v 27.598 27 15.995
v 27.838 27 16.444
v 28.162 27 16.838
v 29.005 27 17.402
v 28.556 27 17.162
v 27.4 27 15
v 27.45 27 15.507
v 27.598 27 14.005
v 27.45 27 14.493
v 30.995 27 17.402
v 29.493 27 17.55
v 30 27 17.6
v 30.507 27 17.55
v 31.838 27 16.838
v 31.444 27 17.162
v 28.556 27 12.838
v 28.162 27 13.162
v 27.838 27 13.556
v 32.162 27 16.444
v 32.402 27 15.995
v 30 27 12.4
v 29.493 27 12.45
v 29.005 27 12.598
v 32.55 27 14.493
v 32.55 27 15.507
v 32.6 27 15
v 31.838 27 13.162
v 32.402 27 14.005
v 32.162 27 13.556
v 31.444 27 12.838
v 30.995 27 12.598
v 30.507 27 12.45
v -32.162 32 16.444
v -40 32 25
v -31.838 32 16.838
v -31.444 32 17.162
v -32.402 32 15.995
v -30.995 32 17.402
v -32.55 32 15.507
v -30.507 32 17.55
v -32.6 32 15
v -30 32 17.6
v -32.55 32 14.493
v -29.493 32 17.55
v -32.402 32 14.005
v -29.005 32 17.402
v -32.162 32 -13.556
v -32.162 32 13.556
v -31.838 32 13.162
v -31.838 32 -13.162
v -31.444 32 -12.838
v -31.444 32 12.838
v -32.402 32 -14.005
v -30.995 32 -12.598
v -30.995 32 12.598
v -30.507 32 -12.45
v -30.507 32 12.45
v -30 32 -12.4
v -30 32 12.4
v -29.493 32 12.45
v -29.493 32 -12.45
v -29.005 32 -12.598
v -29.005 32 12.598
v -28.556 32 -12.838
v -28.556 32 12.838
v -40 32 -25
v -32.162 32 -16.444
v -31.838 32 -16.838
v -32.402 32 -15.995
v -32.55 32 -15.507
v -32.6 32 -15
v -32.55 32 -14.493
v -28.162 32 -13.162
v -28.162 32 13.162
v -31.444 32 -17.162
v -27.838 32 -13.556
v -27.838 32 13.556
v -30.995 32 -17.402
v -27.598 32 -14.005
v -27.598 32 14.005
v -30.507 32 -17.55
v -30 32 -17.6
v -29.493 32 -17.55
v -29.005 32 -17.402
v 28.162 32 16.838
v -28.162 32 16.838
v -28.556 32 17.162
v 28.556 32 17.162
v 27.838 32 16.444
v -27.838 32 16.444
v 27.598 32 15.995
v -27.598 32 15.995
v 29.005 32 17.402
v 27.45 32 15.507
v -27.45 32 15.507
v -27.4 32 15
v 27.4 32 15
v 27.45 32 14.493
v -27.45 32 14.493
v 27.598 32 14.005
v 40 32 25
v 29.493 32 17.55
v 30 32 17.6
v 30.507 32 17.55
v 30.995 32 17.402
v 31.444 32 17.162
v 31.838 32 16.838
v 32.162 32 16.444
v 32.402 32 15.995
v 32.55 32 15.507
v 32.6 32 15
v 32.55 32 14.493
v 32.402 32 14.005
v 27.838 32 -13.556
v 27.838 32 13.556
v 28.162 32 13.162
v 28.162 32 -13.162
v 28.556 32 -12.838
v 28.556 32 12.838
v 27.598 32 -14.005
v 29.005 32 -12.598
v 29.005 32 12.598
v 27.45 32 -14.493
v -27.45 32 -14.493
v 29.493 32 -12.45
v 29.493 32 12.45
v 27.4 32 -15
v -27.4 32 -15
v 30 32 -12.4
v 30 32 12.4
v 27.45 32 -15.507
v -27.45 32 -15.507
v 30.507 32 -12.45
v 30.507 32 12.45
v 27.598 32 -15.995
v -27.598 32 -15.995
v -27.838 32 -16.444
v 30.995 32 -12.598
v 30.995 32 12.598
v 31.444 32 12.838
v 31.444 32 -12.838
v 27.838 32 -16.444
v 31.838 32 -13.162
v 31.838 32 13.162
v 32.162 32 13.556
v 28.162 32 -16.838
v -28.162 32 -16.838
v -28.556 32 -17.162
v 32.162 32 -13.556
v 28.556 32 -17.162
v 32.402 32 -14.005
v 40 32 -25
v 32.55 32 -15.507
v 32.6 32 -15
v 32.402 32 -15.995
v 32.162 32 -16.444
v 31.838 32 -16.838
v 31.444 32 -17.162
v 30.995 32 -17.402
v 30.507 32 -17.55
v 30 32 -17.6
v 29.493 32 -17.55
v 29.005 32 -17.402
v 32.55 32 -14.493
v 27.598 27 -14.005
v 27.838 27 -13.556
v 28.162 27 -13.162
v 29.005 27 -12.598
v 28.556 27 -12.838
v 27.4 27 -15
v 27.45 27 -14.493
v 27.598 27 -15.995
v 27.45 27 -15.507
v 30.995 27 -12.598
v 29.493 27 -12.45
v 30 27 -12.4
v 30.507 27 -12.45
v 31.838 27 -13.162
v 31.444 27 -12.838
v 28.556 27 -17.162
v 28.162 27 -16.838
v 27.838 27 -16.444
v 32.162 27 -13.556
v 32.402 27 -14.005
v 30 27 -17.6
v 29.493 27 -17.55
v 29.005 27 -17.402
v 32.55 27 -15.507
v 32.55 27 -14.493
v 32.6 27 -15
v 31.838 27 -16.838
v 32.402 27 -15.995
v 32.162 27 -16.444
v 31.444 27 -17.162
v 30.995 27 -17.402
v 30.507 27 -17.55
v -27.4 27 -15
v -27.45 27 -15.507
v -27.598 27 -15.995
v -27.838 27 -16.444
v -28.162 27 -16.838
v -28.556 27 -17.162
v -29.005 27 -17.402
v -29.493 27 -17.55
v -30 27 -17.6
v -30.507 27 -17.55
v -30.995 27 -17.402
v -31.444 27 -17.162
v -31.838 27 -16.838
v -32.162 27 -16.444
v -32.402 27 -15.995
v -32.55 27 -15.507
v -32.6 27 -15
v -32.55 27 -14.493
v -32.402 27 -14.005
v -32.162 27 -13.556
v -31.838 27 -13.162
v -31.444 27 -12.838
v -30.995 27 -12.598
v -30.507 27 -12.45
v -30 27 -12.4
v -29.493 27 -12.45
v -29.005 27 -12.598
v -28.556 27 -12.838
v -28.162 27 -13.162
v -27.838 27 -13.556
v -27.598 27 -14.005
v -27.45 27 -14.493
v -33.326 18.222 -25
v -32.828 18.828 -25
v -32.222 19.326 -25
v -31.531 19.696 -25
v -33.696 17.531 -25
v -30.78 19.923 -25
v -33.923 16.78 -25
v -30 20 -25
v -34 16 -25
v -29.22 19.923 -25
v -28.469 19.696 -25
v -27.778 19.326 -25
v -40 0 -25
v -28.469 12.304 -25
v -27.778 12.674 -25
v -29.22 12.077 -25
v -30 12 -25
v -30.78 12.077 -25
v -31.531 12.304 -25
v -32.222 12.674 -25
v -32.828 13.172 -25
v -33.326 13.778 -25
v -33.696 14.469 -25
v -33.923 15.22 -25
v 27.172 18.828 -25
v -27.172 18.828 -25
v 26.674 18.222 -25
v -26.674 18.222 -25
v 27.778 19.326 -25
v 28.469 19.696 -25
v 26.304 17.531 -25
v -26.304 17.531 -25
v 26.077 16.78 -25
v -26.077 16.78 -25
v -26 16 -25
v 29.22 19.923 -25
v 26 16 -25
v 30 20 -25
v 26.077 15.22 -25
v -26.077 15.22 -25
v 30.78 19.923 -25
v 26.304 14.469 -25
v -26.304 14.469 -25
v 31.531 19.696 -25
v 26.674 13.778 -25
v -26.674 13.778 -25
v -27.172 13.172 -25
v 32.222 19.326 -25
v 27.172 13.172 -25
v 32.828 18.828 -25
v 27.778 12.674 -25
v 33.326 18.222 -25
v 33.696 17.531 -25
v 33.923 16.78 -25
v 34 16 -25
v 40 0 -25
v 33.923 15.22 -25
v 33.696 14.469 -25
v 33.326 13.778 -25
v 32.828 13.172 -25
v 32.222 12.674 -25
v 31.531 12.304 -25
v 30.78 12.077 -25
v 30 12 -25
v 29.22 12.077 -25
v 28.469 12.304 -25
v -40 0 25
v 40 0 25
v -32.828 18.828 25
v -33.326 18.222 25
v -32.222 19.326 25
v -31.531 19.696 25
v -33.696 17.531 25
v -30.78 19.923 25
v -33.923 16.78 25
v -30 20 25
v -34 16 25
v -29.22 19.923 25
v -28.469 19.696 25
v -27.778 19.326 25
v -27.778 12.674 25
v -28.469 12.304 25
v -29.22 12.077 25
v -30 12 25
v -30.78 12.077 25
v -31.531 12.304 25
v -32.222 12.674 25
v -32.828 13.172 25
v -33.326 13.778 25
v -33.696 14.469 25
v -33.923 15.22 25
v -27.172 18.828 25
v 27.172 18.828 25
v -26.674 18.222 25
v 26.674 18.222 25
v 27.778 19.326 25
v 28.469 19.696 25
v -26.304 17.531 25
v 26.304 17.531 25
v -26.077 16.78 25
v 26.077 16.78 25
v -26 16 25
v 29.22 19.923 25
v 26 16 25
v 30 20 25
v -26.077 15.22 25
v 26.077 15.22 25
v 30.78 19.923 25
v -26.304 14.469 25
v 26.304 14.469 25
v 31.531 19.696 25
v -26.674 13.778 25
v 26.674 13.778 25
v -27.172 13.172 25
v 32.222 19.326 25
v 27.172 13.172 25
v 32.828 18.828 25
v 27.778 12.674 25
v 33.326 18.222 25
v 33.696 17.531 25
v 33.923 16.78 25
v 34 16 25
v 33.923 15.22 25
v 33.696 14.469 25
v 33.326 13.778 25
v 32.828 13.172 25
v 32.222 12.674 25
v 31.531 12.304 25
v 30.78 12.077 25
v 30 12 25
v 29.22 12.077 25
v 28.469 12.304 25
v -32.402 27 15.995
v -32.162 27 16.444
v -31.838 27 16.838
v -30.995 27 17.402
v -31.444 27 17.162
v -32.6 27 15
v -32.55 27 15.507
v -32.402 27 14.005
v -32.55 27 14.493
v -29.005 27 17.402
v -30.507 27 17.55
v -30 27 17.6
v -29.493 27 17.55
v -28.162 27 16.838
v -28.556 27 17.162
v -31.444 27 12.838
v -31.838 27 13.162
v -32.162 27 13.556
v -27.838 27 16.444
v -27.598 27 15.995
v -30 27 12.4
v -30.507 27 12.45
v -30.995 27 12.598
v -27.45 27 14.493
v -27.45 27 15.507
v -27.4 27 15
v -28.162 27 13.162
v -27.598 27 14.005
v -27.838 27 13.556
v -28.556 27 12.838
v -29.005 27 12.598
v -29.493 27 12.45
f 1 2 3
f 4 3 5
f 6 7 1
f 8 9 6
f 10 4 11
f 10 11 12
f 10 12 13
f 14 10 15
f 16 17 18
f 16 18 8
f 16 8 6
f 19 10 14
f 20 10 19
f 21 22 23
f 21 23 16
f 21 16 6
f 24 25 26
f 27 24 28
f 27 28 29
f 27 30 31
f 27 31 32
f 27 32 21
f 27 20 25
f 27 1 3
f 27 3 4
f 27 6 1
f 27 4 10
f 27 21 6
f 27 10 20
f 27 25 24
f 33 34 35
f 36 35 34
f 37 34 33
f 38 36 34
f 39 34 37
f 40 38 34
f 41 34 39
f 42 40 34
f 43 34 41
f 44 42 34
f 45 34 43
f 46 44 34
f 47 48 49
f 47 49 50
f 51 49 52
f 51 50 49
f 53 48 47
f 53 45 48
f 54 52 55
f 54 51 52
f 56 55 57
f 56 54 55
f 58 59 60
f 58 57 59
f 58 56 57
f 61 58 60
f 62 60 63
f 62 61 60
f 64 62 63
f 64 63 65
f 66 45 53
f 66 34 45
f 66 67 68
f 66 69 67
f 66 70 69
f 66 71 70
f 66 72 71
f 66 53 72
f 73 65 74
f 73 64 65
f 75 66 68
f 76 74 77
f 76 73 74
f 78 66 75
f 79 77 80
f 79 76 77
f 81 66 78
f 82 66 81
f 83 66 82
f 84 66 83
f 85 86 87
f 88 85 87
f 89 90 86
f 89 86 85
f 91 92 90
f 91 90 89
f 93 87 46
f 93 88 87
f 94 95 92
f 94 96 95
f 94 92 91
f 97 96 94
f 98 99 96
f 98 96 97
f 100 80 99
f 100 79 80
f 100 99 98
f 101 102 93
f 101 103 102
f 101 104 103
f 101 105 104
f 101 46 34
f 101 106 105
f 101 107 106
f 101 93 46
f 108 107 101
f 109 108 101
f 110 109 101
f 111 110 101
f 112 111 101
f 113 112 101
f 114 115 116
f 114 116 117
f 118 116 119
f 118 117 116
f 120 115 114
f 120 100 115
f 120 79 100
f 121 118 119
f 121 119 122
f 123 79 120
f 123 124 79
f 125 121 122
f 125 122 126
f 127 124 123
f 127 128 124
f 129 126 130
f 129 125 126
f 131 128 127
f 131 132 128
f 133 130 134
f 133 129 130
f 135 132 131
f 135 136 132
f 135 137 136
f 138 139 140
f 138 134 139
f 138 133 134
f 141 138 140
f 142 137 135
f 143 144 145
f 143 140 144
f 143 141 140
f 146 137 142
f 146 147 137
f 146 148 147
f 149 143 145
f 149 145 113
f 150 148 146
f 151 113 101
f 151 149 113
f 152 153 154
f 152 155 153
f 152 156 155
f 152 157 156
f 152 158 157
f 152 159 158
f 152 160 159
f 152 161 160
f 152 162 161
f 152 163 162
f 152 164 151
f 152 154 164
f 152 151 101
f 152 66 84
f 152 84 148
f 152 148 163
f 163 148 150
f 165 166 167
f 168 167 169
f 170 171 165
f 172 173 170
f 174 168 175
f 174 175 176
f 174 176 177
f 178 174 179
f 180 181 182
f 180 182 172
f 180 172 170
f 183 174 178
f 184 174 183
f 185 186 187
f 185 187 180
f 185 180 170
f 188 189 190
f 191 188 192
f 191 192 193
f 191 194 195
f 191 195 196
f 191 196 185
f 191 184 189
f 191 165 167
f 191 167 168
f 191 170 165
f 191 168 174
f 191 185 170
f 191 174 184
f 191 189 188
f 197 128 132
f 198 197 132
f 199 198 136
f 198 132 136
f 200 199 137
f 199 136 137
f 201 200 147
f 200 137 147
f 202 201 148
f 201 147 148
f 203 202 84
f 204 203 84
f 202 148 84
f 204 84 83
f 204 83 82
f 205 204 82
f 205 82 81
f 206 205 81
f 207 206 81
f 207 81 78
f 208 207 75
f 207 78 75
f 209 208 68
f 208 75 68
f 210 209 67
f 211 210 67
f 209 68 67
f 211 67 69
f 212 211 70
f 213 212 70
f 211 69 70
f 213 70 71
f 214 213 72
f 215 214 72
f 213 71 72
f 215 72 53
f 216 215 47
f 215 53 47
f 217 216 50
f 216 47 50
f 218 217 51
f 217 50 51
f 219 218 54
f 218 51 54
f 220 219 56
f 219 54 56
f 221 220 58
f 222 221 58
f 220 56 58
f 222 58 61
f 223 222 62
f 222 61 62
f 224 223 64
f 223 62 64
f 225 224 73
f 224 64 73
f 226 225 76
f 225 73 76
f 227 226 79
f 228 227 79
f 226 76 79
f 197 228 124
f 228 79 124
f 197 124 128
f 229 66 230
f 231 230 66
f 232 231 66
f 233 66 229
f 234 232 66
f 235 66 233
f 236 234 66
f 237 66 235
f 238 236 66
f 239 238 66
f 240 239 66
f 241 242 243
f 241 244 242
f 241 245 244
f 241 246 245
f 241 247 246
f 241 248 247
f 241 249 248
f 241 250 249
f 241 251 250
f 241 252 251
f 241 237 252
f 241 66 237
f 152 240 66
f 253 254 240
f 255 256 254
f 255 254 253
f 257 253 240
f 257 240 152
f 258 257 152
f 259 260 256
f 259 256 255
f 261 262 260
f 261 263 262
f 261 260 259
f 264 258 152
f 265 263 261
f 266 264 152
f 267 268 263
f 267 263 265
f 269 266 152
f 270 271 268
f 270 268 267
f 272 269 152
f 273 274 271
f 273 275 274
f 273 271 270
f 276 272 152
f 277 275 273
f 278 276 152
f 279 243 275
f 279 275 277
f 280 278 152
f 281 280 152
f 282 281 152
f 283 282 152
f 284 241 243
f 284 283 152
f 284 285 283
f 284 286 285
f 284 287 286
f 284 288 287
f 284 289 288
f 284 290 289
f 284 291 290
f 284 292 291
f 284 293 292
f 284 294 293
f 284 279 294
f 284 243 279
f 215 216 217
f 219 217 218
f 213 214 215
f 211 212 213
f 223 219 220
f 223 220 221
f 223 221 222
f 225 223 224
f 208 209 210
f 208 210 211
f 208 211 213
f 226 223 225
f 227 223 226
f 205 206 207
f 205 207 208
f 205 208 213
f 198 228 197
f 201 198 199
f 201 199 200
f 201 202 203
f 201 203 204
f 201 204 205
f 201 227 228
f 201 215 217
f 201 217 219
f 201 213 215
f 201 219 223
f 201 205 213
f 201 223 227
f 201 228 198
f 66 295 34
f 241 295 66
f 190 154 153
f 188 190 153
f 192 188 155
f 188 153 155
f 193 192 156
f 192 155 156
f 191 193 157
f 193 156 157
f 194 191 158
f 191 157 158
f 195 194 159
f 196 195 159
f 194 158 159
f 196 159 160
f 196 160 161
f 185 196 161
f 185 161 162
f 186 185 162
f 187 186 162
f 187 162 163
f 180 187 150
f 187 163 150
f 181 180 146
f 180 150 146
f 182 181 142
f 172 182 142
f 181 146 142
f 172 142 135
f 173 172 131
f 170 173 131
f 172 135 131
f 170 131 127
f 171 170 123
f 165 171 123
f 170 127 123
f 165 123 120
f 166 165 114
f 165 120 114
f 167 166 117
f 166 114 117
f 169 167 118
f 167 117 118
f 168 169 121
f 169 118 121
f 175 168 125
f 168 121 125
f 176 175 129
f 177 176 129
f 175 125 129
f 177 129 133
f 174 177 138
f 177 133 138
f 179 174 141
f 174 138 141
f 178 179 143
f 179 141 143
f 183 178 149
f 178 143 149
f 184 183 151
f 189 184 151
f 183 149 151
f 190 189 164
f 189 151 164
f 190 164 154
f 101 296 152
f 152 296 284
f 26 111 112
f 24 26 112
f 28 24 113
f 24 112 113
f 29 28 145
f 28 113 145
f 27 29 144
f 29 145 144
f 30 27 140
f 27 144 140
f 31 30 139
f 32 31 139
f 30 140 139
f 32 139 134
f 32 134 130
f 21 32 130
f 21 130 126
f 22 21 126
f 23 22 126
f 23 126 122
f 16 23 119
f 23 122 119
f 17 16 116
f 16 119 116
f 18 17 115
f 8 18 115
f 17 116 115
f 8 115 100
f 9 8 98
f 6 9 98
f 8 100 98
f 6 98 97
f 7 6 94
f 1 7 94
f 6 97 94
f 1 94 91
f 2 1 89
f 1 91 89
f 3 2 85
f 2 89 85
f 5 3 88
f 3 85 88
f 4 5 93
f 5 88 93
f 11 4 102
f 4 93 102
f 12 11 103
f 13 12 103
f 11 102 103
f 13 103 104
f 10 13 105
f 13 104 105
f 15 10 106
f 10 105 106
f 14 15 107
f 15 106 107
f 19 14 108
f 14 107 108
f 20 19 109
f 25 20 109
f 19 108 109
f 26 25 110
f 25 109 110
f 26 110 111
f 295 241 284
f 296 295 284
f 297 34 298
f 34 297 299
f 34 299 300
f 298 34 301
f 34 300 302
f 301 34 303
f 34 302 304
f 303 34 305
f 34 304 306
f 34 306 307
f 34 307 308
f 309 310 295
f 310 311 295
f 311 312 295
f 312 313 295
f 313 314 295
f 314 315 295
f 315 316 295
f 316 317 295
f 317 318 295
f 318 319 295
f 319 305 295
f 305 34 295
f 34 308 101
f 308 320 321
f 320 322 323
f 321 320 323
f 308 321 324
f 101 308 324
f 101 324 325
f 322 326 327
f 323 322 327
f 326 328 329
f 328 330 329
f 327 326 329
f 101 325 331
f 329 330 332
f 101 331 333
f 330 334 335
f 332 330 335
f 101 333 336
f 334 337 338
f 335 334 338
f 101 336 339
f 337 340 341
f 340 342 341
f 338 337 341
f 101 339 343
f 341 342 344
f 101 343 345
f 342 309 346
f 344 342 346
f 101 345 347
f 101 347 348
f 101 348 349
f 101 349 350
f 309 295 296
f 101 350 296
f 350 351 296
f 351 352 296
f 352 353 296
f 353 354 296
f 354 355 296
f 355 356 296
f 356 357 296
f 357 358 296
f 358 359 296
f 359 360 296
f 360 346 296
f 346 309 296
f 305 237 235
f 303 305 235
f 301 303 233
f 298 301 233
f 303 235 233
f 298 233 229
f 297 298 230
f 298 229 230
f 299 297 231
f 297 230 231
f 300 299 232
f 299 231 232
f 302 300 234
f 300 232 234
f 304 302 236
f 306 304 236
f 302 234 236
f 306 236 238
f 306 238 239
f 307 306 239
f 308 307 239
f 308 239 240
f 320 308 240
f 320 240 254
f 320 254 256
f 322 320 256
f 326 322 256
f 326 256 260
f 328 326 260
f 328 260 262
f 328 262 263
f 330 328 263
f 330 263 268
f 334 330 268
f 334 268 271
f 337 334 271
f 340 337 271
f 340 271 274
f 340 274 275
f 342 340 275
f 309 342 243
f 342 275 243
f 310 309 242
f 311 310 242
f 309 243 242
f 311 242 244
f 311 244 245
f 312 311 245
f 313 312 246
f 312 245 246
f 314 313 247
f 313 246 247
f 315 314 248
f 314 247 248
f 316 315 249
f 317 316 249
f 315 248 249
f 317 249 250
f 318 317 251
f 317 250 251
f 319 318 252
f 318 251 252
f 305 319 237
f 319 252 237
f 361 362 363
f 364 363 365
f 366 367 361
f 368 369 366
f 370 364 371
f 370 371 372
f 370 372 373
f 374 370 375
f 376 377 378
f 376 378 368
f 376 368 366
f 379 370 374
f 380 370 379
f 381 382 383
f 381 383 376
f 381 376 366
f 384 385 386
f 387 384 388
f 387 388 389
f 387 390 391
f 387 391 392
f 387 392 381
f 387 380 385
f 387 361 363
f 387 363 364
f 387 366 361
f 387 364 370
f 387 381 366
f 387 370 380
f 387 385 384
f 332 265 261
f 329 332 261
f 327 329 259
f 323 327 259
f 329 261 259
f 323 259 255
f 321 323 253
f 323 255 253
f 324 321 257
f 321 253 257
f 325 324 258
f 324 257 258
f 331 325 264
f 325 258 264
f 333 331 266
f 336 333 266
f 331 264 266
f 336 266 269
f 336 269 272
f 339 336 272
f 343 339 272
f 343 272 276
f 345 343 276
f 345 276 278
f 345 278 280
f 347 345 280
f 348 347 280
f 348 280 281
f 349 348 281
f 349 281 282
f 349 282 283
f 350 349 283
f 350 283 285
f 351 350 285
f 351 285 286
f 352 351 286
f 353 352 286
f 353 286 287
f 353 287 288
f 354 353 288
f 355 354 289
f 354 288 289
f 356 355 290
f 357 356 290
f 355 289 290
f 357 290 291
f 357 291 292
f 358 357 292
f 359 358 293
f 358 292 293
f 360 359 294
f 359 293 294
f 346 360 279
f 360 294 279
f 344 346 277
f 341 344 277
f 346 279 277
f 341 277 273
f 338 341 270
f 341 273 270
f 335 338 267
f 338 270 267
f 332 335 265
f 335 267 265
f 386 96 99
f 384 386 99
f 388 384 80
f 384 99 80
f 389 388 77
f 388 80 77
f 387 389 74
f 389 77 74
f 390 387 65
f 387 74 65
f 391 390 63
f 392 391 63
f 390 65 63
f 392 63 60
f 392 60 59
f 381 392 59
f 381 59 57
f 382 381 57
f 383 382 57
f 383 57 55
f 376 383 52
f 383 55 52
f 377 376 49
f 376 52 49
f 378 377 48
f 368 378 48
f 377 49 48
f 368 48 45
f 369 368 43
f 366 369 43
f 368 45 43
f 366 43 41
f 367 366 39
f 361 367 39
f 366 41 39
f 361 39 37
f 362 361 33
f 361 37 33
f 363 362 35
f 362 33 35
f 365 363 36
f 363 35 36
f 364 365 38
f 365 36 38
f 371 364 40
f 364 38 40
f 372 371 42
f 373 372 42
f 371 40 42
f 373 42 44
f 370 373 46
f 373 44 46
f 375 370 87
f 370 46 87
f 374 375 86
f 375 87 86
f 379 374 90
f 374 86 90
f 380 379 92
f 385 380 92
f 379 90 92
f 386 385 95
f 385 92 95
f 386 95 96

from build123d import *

# Parameters (mm, degrees)
SKETCH3_W           = 80
SKETCH3_H           = 50
BOSS_EXTRUDE1_DEPTH = 32
SKETCH4_R           = 2.6
CUT_EXTRUDE1_DEPTH  = 5
SKETCH5_R           = 4
CUT_EXTRUDE2_DEPTH  = 65


with BuildPart() as part:
    # Sketch3 → Boss-Extrude1 (new body)
    with BuildSketch(Plane(origin=(0, 0, 0), x_dir=(1, 0, 0), z_dir=(0, 1, 0))):
        Rectangle(SKETCH3_W, SKETCH3_H)
    extrude(amount=BOSS_EXTRUDE1_DEPTH)

    # Sketch4 → Cut-Extrude1 (cut)
    with BuildSketch(Plane(origin=(0, 32, 0), x_dir=(1, 0, 0), z_dir=(0, 1, 0))):
        with Locations((-30, 15)):
            Circle(SKETCH4_R)
        with Locations((30, 15)):
            Circle(SKETCH4_R)
        with Locations((30, -15)):
            Circle(SKETCH4_R)
        with Locations((-30, -15)):
            Circle(SKETCH4_R)
    extrude(amount=-CUT_EXTRUDE1_DEPTH, mode=Mode.SUBTRACT)

    # Sketch5 → Cut-Extrude2 (cut)
    with BuildSketch(Plane(origin=(0, 0, -25), x_dir=(-1, 0, 0), z_dir=(0, 0, -1))):
        with Locations((-30, 16)):
            Circle(SKETCH5_R)
        with Locations((30, 16)):
            Circle(SKETCH5_R)
    extrude(amount=-CUT_EXTRUDE2_DEPTH, mode=Mode.SUBTRACT)


solid = part.part
